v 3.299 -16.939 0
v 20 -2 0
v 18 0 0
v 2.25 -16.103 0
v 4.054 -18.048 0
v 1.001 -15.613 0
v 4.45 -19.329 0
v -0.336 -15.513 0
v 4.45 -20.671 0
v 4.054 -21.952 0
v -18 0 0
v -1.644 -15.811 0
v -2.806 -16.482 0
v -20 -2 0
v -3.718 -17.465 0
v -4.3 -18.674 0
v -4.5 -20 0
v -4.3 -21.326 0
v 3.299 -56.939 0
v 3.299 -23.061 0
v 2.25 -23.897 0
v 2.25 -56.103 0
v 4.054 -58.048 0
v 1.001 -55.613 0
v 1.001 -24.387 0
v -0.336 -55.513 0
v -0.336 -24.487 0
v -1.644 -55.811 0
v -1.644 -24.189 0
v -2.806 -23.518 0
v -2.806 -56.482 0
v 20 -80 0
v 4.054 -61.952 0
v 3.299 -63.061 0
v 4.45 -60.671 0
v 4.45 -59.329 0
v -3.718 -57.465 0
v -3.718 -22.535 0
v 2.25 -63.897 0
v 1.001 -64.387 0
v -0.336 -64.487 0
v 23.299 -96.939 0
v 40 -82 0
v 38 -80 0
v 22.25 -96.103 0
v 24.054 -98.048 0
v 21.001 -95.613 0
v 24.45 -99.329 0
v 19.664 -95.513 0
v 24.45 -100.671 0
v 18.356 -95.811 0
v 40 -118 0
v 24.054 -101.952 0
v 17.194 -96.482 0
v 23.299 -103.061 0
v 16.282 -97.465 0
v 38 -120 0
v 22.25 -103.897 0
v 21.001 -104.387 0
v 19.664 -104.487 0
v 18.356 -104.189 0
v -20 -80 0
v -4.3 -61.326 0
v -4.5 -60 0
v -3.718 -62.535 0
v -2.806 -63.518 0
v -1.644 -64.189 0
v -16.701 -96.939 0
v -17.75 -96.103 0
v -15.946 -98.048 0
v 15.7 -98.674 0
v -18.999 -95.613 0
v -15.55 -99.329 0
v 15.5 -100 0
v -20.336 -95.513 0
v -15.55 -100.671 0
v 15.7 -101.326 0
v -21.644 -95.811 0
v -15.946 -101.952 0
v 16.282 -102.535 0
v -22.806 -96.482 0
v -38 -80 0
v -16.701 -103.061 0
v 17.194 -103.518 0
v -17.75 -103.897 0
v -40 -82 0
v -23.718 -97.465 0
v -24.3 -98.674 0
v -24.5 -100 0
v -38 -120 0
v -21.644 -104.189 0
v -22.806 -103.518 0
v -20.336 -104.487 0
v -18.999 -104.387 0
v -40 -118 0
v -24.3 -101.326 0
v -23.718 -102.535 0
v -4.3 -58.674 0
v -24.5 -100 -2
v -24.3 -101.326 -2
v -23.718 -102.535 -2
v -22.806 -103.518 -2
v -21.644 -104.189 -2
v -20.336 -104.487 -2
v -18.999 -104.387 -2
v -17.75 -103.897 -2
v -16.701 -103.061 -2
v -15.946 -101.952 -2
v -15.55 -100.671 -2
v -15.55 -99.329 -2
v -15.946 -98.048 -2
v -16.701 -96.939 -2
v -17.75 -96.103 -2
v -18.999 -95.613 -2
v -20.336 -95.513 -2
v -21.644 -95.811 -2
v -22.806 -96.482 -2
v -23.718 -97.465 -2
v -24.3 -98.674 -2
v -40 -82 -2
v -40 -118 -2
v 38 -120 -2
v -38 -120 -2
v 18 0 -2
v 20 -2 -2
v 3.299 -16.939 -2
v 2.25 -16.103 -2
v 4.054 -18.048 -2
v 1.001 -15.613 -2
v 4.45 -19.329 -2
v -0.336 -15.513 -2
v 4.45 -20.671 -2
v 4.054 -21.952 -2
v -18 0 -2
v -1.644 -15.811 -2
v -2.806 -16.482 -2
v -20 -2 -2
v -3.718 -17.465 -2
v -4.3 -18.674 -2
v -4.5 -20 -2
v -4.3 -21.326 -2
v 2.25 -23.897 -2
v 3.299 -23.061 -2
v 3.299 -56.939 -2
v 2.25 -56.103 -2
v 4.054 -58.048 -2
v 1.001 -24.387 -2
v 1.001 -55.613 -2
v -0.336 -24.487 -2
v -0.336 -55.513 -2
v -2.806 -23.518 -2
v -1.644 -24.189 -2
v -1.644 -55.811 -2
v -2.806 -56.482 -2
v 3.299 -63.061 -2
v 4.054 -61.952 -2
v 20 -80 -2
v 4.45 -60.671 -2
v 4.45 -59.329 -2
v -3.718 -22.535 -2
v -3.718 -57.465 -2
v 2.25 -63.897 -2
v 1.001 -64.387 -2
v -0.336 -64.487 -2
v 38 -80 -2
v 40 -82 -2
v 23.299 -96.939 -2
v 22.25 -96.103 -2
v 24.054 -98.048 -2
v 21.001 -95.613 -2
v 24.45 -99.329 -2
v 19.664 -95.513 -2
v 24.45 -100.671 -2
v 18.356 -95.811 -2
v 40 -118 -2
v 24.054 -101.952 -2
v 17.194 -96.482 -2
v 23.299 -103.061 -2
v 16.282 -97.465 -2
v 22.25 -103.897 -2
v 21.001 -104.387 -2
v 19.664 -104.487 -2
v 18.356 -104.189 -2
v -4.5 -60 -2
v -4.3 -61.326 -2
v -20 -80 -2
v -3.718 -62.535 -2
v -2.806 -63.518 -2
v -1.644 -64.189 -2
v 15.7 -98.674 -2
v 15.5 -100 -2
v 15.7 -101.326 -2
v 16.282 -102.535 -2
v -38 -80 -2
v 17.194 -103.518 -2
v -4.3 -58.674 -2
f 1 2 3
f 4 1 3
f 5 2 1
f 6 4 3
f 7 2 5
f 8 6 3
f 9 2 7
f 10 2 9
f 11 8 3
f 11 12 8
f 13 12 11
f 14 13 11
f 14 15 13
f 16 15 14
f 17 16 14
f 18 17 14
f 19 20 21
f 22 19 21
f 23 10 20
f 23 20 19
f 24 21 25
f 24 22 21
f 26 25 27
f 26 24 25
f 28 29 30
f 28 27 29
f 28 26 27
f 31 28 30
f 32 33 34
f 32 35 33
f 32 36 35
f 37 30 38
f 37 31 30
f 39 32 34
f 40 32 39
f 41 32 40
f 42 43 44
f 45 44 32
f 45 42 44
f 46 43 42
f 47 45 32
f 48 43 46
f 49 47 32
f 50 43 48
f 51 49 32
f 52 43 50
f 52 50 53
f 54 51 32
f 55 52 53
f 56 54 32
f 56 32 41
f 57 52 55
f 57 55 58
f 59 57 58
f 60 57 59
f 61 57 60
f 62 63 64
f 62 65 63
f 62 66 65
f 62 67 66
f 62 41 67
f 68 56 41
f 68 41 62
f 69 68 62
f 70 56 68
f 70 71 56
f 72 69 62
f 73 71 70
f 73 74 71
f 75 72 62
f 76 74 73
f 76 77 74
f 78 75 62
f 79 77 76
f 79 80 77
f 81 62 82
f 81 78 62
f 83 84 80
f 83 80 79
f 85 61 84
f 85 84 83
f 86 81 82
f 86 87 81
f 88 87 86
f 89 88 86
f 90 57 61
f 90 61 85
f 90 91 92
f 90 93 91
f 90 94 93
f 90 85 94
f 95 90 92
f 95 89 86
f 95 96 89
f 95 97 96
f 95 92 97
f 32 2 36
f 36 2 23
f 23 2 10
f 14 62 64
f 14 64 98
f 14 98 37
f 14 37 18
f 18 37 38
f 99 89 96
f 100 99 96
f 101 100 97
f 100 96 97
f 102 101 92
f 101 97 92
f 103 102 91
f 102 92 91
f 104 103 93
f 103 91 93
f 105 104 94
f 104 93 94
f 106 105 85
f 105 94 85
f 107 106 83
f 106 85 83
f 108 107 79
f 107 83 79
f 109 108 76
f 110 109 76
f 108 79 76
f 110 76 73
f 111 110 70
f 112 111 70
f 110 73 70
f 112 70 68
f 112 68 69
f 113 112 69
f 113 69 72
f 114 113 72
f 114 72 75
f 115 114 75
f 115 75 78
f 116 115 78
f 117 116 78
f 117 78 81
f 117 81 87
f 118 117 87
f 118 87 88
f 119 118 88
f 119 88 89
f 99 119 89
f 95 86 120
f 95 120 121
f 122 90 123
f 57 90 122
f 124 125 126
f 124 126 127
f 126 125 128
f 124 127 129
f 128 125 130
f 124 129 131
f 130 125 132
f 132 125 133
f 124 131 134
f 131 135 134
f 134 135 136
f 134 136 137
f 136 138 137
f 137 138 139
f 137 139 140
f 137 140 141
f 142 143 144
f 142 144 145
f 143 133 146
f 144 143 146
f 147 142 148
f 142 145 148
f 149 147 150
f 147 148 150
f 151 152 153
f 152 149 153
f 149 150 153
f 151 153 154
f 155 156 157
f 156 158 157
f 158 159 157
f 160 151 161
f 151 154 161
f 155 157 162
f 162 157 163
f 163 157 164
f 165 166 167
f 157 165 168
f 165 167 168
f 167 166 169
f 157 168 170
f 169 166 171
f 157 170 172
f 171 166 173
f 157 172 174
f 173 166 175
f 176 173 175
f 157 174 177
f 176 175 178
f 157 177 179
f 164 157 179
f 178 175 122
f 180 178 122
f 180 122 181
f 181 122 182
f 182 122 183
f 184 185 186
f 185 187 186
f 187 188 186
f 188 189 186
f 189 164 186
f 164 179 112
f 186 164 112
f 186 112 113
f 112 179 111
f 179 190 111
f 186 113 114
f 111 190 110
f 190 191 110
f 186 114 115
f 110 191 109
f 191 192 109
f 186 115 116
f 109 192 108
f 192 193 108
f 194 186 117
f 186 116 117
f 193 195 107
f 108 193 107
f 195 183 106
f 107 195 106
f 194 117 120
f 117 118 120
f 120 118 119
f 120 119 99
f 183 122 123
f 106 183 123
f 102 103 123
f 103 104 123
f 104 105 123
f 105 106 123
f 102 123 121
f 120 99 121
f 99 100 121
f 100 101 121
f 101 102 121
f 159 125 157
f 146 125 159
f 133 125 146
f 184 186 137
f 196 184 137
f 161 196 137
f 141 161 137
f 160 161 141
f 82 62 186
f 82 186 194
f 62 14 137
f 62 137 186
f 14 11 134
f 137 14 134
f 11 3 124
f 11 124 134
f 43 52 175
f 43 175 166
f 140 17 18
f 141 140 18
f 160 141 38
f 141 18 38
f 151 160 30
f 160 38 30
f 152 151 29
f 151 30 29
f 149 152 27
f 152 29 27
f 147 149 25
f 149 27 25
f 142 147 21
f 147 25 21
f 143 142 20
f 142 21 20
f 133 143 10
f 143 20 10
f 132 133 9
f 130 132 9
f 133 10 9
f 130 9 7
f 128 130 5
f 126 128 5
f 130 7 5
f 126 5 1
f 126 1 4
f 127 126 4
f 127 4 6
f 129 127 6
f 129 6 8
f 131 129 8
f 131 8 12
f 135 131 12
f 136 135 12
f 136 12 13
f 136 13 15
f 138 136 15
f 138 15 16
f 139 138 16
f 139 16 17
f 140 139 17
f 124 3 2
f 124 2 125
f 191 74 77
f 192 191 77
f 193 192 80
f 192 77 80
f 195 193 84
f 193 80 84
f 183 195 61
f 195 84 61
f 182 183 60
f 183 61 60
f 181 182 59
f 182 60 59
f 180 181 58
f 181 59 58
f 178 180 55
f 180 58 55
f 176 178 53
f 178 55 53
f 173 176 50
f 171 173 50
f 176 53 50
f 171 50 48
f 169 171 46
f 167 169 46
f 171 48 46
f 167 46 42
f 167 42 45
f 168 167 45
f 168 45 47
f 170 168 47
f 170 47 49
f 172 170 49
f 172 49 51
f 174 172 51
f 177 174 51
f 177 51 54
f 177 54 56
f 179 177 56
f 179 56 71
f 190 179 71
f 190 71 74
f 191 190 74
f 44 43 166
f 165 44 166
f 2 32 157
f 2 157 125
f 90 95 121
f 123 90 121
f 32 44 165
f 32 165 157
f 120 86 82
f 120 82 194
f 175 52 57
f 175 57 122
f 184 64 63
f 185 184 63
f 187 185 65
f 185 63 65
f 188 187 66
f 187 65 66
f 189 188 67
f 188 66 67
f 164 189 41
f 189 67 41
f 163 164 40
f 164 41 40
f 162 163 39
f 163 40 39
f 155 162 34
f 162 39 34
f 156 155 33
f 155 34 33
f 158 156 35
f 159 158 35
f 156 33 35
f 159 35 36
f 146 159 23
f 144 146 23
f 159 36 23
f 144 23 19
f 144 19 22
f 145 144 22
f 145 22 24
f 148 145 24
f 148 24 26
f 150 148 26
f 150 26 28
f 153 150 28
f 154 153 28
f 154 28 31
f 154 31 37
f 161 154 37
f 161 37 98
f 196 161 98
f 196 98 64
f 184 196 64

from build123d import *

# Parameters (mm, degrees)
EXTRUDE_1_DEPTH   = 2
HOLE_WIZARD_M81_D = 9
CHAMFER_1_SIZE    = 2


with BuildPart() as part:
    # Эскиз1 → Бобышка-Вытянуть1 (new body)
    with BuildSketch(Plane(origin=(0, 0, 0), x_dir=(1, 0, 0), z_dir=(0, 0, -1))):
        Polygon((-40, 120), (40, 120), (40, 80), (20, 80), (20, 0), (-20, 0), (-20, 80), (-40, 80), align=None)
    extrude(amount=EXTRUDE_1_DEPTH)

    # Отверстие с зазором M81 (through all)
    with Locations(Plane(origin=(0, 0, -2), x_dir=(1, 0, 0), z_dir=(0, 0, -1))):
        with Locations((20, 100), (0, 60), (0, 20), (-20, 100)):
            Hole(HOLE_WIZARD_M81_D / 2)

    # Фаска1
    chamfer_1_edges = [part.edges().sort_by_distance(p)[0] for p in [
        (-40, -80, -1),
        (-40, -120, -1),
        (40, -120, -1),
        (40, -80, -1),
        (20, 0, -1),
        (-20, 0, -1),
    ]]
    chamfer(chamfer_1_edges, length=CHAMFER_1_SIZE)


solid = part.part
